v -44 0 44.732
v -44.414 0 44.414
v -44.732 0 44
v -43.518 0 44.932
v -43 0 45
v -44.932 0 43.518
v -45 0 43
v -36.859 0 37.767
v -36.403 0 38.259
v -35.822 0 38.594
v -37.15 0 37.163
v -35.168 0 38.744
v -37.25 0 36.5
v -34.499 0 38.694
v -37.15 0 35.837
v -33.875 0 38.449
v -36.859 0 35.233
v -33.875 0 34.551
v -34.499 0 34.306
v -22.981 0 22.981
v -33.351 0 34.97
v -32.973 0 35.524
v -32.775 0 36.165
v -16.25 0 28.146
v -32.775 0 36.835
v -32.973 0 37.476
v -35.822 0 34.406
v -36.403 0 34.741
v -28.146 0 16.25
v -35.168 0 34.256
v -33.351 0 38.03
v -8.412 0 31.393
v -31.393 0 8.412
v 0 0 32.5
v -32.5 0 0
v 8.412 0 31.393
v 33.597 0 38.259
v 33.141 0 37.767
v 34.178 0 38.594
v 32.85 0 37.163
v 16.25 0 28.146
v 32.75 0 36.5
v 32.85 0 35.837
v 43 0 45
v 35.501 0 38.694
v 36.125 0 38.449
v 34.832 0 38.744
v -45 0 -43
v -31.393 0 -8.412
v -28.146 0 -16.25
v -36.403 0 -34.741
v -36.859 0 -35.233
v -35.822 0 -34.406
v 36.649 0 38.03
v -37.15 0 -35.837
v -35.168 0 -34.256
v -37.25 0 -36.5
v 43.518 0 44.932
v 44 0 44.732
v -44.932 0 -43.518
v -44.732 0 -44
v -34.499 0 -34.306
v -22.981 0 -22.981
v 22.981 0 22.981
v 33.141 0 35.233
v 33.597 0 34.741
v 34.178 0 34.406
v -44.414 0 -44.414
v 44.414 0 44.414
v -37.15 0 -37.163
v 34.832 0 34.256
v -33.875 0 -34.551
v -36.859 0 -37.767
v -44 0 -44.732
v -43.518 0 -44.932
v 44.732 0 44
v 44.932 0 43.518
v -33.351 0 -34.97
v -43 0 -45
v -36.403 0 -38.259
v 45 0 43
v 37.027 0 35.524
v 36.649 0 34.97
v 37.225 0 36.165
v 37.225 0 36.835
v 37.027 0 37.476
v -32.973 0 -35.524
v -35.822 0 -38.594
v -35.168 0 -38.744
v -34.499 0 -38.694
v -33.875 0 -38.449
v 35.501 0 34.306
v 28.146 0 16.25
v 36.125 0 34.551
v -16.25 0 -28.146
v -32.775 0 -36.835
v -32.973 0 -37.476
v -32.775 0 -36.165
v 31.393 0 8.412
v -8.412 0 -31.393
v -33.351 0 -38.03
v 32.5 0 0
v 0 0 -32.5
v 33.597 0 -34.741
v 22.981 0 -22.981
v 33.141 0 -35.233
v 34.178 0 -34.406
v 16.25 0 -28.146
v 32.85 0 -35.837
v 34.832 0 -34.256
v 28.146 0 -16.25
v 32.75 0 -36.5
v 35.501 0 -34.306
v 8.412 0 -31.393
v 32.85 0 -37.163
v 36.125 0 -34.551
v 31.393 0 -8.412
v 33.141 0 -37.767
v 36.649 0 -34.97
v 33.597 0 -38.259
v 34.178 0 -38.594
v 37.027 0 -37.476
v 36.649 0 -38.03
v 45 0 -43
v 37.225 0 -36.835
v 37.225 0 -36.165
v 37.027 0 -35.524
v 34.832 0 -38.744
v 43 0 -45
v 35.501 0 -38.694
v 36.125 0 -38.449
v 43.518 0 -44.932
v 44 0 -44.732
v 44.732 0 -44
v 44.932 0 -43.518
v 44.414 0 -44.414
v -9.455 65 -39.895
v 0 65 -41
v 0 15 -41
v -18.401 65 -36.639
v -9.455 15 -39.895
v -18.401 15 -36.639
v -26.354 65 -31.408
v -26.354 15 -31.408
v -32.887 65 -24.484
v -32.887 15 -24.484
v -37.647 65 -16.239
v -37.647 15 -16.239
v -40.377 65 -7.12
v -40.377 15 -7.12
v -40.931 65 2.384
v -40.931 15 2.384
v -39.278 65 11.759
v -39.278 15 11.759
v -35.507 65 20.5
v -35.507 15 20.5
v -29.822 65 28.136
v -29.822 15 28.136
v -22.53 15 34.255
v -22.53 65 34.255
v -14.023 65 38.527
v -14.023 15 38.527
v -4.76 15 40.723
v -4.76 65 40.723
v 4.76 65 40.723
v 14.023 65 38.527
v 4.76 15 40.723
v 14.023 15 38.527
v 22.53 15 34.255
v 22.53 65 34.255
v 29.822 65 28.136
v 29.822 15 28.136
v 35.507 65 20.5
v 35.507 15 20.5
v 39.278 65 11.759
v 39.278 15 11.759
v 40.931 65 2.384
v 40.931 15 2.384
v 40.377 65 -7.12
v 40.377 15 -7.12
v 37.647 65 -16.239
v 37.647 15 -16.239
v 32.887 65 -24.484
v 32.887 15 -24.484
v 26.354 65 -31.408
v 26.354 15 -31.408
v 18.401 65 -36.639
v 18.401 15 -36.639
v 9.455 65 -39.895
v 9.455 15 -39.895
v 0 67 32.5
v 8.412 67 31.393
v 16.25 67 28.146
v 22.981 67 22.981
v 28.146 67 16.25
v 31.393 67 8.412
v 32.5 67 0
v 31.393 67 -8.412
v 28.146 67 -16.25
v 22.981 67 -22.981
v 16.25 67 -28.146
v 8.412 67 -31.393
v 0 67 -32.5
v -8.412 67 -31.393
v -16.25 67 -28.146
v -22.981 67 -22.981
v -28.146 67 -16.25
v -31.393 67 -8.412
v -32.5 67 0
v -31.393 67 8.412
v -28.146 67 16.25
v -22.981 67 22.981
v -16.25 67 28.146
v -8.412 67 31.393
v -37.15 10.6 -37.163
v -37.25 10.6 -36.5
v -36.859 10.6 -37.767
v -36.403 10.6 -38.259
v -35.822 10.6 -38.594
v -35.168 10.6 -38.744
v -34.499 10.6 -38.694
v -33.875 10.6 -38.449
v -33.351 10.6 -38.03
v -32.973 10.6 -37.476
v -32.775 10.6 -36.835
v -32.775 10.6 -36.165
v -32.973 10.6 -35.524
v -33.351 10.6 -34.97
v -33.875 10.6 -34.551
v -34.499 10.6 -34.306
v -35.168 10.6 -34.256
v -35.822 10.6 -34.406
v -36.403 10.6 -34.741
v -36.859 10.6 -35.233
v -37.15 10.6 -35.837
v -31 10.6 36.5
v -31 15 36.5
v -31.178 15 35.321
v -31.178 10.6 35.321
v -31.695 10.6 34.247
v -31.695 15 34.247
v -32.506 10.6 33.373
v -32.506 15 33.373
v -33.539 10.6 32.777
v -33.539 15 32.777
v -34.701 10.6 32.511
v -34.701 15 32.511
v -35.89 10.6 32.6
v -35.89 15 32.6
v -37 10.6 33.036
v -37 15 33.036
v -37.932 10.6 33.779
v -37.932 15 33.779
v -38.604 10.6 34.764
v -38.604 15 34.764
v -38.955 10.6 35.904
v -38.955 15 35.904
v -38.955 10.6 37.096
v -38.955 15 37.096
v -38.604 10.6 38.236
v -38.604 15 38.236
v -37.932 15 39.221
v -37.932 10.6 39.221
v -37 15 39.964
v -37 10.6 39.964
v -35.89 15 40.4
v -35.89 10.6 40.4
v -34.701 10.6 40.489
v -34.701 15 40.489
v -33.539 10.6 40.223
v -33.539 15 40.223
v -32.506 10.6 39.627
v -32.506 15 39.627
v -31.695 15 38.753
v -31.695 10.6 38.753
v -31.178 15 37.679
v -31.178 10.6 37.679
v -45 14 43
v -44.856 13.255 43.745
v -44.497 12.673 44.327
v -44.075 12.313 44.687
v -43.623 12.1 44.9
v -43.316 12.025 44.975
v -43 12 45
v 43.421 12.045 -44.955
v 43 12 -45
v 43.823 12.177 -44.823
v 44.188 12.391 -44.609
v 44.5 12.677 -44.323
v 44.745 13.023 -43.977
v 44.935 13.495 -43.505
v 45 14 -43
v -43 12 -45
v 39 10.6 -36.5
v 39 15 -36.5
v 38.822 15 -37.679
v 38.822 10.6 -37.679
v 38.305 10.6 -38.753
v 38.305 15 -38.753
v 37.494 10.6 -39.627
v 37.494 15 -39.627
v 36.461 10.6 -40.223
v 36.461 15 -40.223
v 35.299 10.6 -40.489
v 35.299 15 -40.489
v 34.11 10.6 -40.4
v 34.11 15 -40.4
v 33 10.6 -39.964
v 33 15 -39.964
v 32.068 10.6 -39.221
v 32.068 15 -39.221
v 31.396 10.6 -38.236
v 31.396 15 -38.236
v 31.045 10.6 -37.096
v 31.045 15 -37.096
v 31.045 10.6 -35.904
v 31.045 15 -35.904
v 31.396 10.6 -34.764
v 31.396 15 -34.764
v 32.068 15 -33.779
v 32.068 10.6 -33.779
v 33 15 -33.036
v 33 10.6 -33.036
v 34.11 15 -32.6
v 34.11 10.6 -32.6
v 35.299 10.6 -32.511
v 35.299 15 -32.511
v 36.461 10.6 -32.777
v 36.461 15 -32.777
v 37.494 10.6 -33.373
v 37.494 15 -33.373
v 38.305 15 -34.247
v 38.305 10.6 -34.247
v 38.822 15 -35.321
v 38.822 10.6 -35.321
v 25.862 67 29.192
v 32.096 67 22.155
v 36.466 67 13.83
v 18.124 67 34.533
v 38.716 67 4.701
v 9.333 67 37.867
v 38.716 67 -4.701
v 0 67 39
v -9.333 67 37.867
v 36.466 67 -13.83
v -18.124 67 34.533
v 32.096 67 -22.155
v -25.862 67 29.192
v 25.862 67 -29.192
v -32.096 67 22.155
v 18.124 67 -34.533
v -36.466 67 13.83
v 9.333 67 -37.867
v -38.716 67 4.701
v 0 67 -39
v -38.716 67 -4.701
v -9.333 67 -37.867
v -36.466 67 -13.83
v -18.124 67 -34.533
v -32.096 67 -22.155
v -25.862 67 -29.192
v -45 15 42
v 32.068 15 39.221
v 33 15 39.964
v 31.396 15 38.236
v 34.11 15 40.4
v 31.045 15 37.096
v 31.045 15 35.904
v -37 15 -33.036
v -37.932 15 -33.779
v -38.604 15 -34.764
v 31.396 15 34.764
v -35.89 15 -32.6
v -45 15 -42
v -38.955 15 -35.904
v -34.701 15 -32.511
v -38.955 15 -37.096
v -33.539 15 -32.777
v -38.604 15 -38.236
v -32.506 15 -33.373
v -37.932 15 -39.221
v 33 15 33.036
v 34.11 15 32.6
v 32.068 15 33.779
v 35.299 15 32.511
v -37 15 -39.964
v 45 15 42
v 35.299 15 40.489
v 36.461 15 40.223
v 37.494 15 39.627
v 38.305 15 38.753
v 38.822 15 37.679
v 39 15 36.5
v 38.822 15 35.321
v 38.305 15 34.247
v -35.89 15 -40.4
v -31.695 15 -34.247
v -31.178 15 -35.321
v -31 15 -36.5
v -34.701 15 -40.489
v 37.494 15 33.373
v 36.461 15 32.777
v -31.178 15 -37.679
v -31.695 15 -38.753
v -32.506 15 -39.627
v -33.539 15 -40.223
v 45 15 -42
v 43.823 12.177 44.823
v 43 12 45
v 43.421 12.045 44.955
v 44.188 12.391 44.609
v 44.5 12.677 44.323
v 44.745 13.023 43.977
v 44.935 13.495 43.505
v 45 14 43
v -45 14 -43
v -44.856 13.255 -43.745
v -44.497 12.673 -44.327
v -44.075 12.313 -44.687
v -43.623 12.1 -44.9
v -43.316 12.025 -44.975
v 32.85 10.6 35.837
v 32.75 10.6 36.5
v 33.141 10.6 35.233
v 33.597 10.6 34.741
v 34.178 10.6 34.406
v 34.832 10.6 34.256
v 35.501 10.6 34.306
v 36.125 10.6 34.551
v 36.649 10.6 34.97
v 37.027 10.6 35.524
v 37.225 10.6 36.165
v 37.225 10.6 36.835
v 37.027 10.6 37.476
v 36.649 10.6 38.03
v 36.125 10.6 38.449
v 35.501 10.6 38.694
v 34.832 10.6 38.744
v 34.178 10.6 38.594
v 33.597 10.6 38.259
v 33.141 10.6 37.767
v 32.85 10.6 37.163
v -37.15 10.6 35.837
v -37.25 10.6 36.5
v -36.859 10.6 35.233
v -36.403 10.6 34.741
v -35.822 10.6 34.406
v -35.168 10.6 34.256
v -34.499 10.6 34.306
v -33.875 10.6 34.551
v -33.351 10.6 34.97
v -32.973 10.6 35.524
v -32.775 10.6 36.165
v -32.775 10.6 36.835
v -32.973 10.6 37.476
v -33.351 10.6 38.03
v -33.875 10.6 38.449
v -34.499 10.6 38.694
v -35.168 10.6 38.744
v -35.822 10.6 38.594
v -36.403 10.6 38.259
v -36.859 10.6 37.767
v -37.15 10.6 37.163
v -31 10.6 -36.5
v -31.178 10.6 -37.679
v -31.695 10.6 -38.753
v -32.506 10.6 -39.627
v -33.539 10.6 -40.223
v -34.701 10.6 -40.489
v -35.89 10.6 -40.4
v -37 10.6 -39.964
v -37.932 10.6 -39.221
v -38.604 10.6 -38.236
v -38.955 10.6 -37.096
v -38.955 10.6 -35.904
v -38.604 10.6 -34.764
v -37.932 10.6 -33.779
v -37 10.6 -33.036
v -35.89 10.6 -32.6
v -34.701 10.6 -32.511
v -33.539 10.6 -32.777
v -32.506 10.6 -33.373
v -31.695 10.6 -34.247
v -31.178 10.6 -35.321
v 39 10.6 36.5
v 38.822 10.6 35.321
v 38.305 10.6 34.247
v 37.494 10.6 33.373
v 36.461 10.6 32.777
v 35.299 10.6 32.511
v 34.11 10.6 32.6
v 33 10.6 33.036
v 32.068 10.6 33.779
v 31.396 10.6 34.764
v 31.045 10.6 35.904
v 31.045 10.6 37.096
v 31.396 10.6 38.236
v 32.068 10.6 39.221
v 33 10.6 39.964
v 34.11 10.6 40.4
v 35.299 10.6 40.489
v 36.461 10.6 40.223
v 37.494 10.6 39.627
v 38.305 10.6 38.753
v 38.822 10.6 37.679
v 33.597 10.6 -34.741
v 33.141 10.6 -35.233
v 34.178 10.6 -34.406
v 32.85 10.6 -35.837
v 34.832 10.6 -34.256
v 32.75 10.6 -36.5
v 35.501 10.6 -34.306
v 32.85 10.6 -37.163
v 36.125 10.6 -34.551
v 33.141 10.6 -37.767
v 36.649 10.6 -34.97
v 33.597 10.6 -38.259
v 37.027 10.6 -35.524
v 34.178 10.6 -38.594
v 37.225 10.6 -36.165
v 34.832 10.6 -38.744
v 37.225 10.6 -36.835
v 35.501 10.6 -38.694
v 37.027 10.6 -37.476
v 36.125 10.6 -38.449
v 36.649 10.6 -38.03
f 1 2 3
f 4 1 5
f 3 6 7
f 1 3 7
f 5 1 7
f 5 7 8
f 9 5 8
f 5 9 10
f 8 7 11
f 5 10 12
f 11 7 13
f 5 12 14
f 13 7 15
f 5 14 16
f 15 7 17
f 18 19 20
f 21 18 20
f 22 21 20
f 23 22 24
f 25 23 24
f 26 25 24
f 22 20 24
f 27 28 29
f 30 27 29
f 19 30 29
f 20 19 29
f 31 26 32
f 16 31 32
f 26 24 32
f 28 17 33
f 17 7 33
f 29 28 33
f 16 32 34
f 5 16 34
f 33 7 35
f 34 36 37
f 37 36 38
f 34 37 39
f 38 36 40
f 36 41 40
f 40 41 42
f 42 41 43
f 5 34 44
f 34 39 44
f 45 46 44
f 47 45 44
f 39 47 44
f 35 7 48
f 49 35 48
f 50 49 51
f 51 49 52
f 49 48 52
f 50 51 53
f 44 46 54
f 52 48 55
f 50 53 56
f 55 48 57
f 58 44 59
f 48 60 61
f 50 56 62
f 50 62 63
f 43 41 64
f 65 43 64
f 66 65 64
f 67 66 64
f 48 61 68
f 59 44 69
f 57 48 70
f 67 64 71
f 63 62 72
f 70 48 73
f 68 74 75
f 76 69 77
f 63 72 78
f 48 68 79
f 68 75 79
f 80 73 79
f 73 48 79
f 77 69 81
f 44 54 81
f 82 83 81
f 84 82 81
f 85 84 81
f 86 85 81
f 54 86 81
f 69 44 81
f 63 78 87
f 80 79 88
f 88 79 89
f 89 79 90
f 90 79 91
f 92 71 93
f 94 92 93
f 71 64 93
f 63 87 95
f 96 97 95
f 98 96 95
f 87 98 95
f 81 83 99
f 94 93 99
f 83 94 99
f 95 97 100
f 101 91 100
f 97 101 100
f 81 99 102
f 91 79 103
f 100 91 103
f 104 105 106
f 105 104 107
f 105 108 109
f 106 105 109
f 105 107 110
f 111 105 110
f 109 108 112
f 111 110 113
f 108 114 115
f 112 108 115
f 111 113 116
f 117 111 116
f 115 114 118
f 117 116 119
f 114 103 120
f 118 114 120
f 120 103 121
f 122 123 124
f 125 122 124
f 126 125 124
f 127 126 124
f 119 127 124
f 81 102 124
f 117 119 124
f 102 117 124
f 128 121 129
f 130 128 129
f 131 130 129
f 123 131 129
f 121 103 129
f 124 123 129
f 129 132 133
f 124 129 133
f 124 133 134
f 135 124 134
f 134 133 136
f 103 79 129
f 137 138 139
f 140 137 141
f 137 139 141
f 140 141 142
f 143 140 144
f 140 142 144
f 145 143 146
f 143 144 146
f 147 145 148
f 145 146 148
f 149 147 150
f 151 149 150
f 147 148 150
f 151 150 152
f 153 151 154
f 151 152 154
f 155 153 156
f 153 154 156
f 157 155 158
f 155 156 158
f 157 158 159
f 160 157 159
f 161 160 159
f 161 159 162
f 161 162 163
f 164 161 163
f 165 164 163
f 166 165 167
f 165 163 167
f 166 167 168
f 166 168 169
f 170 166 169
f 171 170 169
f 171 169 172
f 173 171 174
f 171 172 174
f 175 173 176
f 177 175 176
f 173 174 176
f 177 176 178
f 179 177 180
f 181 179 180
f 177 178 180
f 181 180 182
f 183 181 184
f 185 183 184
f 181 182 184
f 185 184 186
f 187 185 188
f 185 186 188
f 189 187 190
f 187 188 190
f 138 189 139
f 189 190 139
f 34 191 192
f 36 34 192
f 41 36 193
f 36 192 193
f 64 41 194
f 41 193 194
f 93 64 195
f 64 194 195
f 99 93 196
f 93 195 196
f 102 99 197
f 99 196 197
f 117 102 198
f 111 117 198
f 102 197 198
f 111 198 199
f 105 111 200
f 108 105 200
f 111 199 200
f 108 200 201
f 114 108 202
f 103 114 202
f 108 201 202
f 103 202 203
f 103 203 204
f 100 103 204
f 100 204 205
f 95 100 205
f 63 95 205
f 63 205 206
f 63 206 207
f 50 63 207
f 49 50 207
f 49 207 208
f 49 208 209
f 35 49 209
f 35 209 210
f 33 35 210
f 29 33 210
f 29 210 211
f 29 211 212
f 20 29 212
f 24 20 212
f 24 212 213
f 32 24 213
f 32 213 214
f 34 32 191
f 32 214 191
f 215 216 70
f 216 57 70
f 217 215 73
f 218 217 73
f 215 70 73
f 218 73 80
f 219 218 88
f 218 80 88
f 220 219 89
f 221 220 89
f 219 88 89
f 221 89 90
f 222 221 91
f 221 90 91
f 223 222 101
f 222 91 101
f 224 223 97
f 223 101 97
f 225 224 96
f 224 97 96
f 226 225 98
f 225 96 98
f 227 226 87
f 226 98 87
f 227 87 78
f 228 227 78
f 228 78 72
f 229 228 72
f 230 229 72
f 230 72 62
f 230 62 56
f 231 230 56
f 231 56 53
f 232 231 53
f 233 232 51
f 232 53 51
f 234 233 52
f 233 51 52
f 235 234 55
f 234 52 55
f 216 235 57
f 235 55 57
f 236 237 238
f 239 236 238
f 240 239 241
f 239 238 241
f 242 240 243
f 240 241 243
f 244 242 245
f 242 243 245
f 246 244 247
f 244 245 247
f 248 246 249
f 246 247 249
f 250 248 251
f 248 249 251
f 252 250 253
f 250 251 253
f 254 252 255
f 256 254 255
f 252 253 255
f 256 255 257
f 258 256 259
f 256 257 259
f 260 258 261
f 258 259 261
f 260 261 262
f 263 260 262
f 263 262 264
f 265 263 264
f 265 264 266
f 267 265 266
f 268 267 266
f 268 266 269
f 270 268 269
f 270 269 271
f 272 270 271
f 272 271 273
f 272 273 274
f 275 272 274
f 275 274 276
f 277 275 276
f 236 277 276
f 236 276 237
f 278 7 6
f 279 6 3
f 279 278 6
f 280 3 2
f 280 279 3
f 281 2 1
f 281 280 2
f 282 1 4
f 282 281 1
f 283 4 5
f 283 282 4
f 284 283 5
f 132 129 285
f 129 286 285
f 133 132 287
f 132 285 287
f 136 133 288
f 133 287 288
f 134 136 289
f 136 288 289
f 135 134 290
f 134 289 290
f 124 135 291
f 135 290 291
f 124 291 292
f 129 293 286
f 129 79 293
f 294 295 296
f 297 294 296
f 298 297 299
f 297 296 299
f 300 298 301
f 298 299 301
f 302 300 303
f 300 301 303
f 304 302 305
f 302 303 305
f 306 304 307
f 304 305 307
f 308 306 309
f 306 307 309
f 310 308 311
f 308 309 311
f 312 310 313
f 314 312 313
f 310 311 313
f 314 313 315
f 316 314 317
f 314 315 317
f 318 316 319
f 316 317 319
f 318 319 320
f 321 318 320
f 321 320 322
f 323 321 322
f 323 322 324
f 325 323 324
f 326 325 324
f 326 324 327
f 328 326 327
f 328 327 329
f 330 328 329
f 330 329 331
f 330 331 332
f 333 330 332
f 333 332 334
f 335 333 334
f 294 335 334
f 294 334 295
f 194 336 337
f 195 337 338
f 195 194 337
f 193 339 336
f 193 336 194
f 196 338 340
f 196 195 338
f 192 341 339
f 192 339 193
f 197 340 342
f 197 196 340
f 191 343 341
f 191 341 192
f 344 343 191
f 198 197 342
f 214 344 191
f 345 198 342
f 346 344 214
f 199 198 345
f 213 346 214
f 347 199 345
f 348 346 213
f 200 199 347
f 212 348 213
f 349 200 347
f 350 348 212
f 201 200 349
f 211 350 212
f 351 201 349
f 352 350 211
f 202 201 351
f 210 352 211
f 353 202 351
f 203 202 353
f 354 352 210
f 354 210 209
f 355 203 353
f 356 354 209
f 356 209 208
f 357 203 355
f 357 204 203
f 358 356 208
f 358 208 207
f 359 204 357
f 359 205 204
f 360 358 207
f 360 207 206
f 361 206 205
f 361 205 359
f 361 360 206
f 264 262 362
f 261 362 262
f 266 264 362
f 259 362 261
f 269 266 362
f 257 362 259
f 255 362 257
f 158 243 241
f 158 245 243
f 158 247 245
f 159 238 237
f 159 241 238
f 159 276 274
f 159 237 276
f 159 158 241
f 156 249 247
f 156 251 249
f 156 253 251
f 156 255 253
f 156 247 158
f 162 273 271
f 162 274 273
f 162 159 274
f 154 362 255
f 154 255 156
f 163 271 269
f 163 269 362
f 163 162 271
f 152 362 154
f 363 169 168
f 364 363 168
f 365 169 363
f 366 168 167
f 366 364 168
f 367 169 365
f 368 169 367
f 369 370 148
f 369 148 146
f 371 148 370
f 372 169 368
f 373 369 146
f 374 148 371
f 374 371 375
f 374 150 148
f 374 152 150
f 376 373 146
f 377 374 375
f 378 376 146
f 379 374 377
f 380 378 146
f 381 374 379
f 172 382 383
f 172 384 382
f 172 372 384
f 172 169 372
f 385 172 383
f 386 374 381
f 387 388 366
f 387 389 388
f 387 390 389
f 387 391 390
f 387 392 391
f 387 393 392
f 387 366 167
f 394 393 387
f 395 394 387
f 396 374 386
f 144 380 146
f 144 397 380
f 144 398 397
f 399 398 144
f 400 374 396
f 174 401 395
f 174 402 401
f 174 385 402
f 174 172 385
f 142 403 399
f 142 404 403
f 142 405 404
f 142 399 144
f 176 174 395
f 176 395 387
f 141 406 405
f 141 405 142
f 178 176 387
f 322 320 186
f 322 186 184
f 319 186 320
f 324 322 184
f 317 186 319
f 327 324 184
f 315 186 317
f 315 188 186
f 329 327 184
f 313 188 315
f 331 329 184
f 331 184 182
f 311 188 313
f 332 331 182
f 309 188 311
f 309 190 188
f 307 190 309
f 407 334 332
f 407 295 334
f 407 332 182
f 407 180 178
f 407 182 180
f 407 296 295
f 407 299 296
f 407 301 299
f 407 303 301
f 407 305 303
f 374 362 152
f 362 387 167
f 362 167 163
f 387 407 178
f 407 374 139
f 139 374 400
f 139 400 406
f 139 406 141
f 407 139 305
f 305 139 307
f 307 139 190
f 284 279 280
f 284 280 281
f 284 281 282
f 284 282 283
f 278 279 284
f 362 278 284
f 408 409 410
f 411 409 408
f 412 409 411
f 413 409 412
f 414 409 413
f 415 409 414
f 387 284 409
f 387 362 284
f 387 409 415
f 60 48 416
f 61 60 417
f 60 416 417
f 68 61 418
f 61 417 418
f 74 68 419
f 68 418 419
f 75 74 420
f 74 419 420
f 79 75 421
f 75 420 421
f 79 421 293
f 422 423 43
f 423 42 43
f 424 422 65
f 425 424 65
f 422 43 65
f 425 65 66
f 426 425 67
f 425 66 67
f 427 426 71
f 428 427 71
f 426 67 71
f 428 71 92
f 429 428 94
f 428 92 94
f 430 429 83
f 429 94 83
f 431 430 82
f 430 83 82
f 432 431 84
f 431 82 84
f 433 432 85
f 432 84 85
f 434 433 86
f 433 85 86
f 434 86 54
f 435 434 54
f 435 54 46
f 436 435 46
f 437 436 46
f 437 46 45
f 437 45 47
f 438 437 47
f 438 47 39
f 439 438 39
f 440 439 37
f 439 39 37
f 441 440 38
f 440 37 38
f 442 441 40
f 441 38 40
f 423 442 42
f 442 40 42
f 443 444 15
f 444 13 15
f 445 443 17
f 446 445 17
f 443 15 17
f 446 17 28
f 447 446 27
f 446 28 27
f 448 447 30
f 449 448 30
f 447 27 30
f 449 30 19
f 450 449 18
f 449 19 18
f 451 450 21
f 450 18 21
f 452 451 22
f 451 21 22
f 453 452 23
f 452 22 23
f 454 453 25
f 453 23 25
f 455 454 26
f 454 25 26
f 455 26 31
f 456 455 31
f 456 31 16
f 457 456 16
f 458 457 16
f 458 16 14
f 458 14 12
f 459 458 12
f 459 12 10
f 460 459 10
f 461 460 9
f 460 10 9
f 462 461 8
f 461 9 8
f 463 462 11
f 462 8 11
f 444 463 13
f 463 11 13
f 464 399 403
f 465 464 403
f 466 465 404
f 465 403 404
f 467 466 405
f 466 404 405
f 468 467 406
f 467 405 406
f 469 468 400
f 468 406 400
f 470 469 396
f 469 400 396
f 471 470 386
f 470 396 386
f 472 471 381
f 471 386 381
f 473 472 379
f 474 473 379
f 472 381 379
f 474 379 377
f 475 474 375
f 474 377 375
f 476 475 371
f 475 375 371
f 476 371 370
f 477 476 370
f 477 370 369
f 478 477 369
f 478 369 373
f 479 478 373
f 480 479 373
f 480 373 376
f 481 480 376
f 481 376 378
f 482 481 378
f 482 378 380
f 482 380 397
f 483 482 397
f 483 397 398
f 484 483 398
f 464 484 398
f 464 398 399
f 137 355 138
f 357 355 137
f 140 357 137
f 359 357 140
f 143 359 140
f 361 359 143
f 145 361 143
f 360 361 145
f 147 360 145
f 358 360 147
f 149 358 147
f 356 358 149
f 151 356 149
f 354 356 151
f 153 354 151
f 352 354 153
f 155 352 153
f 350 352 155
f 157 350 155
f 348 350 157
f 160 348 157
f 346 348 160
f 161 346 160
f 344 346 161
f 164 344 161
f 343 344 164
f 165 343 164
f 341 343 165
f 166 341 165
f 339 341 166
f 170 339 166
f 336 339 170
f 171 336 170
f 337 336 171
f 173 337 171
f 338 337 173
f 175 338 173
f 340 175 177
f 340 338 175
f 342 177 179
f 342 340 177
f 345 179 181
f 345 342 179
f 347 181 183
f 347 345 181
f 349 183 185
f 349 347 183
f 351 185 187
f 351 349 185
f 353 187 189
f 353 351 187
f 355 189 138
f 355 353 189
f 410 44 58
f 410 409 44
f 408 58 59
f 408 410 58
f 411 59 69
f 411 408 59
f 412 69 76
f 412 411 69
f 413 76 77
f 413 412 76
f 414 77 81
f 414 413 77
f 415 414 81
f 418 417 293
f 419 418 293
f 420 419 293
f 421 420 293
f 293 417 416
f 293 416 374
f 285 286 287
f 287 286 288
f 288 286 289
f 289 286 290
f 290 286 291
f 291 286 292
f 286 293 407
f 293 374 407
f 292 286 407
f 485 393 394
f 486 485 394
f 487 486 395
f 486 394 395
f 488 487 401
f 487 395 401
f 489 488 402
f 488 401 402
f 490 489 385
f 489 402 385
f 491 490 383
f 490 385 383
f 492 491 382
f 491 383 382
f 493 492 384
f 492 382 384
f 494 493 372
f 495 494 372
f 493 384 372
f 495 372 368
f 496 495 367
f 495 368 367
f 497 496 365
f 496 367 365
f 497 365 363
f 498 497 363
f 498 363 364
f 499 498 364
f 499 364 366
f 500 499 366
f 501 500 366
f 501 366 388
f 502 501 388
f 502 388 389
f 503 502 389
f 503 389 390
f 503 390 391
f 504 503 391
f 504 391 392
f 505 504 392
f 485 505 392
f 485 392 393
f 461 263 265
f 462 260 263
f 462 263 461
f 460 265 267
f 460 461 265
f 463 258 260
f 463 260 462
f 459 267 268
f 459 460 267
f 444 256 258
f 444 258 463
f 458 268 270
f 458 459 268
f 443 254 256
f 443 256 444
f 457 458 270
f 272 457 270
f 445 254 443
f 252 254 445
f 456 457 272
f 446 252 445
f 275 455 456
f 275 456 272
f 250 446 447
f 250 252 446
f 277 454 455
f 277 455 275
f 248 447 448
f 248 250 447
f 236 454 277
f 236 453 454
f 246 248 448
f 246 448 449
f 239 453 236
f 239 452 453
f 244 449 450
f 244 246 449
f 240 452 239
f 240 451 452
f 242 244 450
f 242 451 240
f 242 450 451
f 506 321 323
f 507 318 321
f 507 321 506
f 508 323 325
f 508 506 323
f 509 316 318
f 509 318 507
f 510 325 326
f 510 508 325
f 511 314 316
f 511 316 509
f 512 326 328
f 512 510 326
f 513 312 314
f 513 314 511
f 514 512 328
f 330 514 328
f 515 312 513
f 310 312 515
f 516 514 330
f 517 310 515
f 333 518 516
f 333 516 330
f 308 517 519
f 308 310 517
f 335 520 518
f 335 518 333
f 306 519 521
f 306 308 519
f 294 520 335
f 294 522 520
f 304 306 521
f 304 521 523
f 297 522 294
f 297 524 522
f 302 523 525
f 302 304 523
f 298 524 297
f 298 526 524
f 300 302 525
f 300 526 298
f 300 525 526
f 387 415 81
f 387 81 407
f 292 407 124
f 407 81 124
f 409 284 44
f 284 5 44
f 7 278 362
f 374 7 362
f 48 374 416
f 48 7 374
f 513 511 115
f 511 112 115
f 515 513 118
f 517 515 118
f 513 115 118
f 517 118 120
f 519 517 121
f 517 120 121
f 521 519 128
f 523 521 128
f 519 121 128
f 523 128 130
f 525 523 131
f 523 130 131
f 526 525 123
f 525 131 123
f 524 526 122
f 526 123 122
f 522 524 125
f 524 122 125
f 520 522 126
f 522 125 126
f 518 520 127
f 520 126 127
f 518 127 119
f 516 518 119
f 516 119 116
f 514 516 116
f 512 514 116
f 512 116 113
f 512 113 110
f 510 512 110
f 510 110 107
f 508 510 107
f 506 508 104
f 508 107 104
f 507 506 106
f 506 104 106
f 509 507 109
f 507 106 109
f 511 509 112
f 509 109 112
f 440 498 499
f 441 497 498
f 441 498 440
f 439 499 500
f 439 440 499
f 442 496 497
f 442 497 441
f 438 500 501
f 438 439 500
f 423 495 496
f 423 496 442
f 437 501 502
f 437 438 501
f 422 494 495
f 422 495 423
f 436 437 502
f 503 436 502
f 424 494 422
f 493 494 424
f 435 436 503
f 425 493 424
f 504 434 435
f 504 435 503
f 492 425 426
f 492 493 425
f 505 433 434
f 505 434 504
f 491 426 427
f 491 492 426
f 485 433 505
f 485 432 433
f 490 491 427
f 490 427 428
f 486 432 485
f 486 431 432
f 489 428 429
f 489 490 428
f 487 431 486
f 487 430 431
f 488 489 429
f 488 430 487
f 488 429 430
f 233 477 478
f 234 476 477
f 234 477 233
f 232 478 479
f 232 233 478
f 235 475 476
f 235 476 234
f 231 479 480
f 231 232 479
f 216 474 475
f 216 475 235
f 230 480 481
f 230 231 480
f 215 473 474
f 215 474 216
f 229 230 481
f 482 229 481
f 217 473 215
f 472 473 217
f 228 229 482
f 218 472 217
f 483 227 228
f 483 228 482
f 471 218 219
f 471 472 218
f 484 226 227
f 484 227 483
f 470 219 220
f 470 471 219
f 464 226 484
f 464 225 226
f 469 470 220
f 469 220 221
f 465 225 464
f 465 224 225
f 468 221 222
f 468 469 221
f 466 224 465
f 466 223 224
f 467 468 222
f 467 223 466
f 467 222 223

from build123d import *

# Parameters (mm, degrees)
ESQUISSE1_W                                        = 90
ESQUISSE1_H                                        = 90
BOSS_EXTRU_1_DEPTH                                 = 15
ESQUISSE2_R                                        = 41
BOSS_EXTRU_2_DEPTH                                 = 52
CHANFREIN1_SIZE                                    = 3
CONG_1_R                                           = 2
CHANFREIN2_SIZE                                    = 2
CHAMBRAGE_POUR_VIS_T_TE_HEXAGONALE_M41_D           = 4.5
CHAMBRAGE_POUR_VIS_T_TE_HEXAGONALE_M41_CBORE_D     = 8
CHAMBRAGE_POUR_VIS_T_TE_HEXAGONALE_M41_CBORE_DEPTH = 4.4
ESQUISSE6_R                                        = 32.5
ENL_V_MAT_EXTRU_1_DEPTH                            = 93.406709713


with BuildPart() as part:
    # Esquisse1 → Boss.-Extru.1 (new body)
    with BuildSketch(Plane(origin=(0, 0, 0), x_dir=(1, 0, 0), z_dir=(0, 1, 0))):
        Rectangle(ESQUISSE1_W, ESQUISSE1_H)
    extrude(amount=BOSS_EXTRU_1_DEPTH)

    # Esquisse2 → Boss.-Extru.2 (add)
    with BuildSketch(Plane(origin=(0, 15, 0), x_dir=(1, 0, 0), z_dir=(0, 1, 0))):
        with Locations(Location((0, 0, 0), (0, 0, 90))):
            Circle(ESQUISSE2_R)
    extrude(amount=BOSS_EXTRU_2_DEPTH)

    # Chanfrein1
    chanfrein1_edges = [part.edges().sort_by_distance(p)[0] for p in [
        (0, 15, -45),
        (0, 15, 45),
    ]]
    chamfer(chanfrein1_edges, length=CHANFREIN1_SIZE)

    # Congé1
    cong_1_edges = [part.edges().sort_by_distance(p)[0] for p in [
        (-45, 6, 45),
        (-45, 6, -45),
        (45, 6, -45),
        (45, 6, 45),
    ]]
    fillet(cong_1_edges, radius=CONG_1_R)

    # Chanfrein2
    chanfrein2_edges = [part.edges().sort_by_distance(p)[0] for p in [
        (0, 67, 41),
    ]]
    chamfer(chanfrein2_edges, length=CHANFREIN2_SIZE)

    # Chambrage pour vis à tête hexagonale M41 (through all)
    with Locations(Plane(origin=(0, 15, 0), x_dir=(1, 0, 0), z_dir=(0, 1, 0))):
        with Locations((-35, 36.5), (35, 36.5), (-35, -36.5), (35, -36.5)):
            CounterBoreHole(CHAMBRAGE_POUR_VIS_T_TE_HEXAGONALE_M41_D / 2, CHAMBRAGE_POUR_VIS_T_TE_HEXAGONALE_M41_CBORE_D / 2, CHAMBRAGE_POUR_VIS_T_TE_HEXAGONALE_M41_CBORE_DEPTH)

    # Esquisse6 → Enlèv. mat.-Extru.1 (cut, through all)
    with BuildSketch(Plane(origin=(0, 67, 0), x_dir=(1, 0, 0), z_dir=(0, 1, 0))):
        with Locations(Location((0, 0, 0), (0, 0, 270))):
            Circle(ESQUISSE6_R)
    extrude(amount=-ENL_V_MAT_EXTRU_1_DEPTH, mode=Mode.SUBTRACT)


solid = part.part
